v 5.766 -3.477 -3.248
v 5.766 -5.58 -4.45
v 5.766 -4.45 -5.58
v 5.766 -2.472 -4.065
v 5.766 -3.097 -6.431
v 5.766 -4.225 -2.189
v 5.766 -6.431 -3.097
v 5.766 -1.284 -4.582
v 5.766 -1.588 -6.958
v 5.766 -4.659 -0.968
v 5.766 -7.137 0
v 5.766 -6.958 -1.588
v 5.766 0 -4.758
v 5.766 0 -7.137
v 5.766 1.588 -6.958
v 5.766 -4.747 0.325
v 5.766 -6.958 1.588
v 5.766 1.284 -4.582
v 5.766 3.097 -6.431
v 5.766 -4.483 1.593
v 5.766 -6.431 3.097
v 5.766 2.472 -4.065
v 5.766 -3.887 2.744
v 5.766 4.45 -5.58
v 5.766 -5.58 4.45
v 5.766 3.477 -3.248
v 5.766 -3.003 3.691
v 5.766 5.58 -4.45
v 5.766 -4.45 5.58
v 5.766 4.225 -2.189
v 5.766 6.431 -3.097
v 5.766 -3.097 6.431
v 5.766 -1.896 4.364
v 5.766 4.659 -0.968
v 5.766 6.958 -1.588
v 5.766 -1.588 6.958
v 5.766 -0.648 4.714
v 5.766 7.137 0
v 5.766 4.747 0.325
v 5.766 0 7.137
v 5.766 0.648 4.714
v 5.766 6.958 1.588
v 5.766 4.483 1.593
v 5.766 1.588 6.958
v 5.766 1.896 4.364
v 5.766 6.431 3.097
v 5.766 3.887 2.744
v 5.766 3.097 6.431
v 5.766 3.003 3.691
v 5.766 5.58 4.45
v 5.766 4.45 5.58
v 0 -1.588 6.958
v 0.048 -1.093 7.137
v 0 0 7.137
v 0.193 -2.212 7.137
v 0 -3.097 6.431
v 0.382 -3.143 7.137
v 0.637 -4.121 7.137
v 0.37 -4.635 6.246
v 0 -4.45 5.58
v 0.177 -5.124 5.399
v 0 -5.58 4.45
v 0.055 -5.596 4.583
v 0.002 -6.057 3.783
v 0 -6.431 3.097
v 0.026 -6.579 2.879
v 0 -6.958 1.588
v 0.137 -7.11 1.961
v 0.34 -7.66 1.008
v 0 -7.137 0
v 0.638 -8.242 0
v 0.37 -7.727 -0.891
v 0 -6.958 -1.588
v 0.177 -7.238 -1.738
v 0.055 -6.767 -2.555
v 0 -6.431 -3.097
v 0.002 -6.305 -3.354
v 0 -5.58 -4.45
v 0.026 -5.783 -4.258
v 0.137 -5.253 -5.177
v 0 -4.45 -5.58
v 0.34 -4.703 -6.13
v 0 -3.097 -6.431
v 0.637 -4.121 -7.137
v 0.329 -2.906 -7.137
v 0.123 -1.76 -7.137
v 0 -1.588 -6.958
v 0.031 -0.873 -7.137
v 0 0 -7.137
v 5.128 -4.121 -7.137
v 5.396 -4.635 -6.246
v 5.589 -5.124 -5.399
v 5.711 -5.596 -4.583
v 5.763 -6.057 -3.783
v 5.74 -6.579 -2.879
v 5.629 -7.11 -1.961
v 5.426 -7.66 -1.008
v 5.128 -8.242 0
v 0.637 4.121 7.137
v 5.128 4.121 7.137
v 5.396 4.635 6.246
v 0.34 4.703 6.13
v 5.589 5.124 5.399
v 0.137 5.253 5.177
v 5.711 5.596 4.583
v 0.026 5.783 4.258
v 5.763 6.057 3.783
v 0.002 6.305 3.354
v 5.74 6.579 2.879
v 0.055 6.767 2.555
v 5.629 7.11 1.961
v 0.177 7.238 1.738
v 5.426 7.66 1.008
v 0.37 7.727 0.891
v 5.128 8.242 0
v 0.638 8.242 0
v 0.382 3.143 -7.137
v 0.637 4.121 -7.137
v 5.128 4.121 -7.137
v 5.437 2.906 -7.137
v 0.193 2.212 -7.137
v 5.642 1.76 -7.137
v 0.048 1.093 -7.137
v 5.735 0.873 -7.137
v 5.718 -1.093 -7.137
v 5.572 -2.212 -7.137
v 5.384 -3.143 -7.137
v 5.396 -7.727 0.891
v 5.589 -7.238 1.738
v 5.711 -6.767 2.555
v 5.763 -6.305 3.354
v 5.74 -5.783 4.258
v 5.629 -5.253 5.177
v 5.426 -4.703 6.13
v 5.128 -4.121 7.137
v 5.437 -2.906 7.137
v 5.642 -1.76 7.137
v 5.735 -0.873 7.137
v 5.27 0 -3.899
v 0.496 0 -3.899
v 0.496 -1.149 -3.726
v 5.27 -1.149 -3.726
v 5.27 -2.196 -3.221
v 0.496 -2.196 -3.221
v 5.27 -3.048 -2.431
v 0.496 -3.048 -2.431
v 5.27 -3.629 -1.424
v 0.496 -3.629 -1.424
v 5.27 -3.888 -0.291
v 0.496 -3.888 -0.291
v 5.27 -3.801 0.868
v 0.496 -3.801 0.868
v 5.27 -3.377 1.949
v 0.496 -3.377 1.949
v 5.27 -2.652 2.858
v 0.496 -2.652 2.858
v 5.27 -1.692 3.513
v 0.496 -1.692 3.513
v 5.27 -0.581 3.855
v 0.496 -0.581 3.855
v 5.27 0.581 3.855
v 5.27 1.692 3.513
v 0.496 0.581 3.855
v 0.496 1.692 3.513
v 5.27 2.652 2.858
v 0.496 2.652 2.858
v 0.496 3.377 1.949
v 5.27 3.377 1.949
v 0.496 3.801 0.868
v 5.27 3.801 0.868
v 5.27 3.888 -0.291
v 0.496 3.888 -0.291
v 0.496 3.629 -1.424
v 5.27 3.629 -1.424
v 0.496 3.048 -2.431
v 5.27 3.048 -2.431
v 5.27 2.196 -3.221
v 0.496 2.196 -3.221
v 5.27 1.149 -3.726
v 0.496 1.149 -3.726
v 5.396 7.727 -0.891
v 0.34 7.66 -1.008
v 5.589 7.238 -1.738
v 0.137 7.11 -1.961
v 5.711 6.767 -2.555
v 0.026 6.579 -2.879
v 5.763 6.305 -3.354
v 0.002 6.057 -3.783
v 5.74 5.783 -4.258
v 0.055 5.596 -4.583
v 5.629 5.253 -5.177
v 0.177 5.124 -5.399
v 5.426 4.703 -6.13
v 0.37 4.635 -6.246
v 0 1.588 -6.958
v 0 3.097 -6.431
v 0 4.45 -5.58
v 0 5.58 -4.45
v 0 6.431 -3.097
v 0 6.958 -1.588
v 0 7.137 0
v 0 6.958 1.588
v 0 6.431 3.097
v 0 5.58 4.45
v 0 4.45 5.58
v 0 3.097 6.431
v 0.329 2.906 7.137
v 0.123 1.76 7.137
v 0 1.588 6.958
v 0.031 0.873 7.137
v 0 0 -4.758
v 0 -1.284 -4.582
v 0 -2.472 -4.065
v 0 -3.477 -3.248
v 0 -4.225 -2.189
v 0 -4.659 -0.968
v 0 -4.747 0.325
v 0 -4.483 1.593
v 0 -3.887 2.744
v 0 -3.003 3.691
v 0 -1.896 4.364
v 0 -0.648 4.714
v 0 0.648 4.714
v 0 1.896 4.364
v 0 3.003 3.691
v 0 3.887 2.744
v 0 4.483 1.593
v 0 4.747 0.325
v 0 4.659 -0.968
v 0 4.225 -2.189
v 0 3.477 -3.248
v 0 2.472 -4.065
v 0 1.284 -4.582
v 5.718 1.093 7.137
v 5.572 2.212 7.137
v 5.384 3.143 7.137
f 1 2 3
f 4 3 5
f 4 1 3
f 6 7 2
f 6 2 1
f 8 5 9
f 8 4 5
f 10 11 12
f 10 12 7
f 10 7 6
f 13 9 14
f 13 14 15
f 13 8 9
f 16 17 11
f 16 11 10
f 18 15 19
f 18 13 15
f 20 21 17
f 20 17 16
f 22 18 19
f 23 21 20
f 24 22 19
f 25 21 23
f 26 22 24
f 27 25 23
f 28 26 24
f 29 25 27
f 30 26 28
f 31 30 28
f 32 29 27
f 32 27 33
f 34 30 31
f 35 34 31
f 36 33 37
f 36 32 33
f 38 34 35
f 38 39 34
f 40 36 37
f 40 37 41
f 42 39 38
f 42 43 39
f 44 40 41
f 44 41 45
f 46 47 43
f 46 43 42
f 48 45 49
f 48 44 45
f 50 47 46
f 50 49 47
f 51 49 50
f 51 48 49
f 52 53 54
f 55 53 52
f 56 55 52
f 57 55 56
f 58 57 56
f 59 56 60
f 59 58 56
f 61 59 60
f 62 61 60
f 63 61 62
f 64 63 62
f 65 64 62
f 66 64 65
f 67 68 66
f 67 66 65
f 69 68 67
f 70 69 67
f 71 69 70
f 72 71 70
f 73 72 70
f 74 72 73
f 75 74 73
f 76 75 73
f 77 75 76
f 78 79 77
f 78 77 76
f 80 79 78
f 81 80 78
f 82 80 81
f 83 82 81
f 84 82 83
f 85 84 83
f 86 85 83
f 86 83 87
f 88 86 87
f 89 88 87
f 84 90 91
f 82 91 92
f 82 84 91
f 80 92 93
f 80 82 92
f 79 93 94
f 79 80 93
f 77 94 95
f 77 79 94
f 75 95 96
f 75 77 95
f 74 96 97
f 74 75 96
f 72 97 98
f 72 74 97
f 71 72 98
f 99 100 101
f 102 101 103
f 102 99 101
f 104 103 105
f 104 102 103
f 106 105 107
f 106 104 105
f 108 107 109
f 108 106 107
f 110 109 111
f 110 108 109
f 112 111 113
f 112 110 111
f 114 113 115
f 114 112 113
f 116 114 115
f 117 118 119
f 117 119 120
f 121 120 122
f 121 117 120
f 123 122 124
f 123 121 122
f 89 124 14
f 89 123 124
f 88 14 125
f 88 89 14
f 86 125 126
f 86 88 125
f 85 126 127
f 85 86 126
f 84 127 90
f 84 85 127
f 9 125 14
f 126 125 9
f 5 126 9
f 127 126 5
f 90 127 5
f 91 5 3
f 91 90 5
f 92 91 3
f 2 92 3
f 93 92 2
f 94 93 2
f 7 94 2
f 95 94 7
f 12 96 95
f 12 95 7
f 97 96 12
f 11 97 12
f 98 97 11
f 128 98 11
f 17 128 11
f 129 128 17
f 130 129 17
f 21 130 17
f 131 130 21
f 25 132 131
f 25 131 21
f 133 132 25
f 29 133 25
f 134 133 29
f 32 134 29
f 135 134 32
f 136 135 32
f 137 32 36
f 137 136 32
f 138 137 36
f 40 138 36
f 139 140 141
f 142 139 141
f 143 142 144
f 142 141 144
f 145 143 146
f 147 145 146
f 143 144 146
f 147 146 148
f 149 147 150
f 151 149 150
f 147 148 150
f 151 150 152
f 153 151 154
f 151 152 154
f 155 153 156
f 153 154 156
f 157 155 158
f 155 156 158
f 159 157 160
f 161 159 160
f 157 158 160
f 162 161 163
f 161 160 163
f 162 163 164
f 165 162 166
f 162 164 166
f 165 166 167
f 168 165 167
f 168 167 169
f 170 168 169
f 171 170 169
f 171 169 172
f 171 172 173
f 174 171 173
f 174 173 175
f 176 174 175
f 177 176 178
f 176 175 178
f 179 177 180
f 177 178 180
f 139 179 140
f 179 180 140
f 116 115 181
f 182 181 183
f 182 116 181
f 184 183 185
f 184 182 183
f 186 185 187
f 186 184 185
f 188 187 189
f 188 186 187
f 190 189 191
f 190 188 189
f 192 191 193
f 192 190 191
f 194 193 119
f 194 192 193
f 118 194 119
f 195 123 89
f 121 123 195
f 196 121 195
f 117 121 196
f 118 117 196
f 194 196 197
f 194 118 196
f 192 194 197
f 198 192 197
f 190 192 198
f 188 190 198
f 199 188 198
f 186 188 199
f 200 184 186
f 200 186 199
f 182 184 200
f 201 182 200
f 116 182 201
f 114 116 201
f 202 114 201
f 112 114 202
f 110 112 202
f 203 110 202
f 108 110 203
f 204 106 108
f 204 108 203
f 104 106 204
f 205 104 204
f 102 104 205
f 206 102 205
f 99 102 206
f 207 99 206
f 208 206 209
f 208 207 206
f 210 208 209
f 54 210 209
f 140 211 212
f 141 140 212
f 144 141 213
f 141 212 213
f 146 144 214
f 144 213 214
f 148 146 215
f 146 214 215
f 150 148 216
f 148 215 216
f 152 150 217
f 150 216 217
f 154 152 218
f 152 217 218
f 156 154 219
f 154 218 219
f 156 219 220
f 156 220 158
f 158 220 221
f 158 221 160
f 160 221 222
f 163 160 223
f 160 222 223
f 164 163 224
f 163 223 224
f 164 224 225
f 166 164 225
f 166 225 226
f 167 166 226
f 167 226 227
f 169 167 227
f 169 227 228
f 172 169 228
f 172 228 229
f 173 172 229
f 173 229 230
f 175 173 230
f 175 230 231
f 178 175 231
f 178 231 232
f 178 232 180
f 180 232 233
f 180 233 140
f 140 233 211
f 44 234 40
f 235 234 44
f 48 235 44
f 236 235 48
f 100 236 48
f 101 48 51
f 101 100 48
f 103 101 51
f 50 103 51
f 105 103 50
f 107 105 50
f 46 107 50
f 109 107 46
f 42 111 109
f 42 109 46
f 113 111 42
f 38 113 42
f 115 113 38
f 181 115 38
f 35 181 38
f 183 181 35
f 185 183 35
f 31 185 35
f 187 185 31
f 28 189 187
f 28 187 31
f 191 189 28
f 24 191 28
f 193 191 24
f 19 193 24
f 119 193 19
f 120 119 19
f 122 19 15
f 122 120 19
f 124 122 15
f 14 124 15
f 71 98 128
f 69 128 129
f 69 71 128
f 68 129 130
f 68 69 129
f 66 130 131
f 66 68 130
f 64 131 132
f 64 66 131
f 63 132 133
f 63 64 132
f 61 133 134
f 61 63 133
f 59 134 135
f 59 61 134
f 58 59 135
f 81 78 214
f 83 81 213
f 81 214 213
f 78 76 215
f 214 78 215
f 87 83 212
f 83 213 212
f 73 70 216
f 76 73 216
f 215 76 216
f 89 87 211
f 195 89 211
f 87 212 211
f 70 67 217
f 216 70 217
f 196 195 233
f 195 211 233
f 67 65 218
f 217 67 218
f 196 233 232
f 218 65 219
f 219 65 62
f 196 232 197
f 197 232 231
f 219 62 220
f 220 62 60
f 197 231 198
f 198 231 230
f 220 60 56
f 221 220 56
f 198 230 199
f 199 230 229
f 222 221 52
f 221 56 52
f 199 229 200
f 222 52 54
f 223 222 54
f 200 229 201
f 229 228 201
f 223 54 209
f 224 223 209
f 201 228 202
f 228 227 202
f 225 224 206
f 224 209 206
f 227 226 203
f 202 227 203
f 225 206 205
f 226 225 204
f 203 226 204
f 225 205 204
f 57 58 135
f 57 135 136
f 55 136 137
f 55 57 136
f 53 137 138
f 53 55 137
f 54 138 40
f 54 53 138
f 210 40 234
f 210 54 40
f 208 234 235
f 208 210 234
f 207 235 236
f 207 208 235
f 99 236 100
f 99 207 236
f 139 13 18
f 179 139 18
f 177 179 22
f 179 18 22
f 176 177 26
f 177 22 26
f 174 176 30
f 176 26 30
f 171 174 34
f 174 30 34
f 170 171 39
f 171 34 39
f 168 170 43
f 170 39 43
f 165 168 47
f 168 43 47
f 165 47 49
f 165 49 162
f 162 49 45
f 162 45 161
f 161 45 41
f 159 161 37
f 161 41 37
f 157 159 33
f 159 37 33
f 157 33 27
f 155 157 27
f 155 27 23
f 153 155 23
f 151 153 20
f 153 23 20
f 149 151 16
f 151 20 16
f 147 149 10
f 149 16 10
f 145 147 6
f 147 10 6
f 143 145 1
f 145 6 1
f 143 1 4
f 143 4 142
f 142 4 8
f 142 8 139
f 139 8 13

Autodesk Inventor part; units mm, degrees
ref_plane "YZ Plane" through (0, 0, 0) normal (1, 0, 0) x (0, 1, 0)
ref_plane "XZ Plane" through (0, 0, 0) normal (0, 1, 0) x (-1, 0, 0)
sketch "Sketch1" plane through (0, 0, 0) normal (1, 0, 0) x (0, 1, 0)
  line L0 (-8.2416, 0) -> (-4.1208, 7.1374)
  line L1 (-4.1208, 7.1374) -> (4.1208, 7.1374)
  line L2 (4.1208, 7.1374) -> (8.2416, 0)
  line L3 (8.2416, 0) -> (4.1208, -7.1374)
  line L4 (4.1208, -7.1374) -> (-4.1208, -7.1374)
  line L5 (-4.1208, -7.1374) -> (-8.2416, 0)
  point P0 (0, 0)
  point P1 (0, 0)
  dimension "d0" = 16.4831
extrude "Body" add sketch "Sketch1" along normal blind 5.7658
sketch "Sketch2" plane through (0, 0, 0) normal (0, 0, 1) x (1, 0, 0)
  line L0 (0, 4.1208) -> (0, 8.2416) projected
  line L1 (0, 8.2416) -> (5.7658, 8.2416) projected
  line L2 (5.7658, 4.1208) -> (5.7658, 8.2416) projected
  line L3 (-1.1532, 0) -> (6.919, 0) projected
  line L4 (0.6375, 8.2416) -> (0, 7.1374)
  line L5 (5.1283, 8.2416) -> (5.7658, 7.1374)
  dimension "d3" = 30
  dimension "d4" = 30
  dimension "d5" = 14.2748
  dimension "d6" = 14.2748
revolve "Chamfer1" cut sketch "Sketch2" angle 360 about axis through (-10, 0, 0) along (1, 0, 0)
sketch "Sketch3" plane through (5.7658, 0, 0) normal (1, 0, 0) x (0, 0, -1)
  arc A0 (-3.5687, -6.1812) -> (3.5687, -6.1812) centre (0, 0) ccw projected
hole "Thread" at (5.7658, 0, 0) direction (-1, 0, 0) diameter 7.7978 end through all thread size "3/8-16 UNC" class "2B" standard "ANSI Unified Screw Threads"
chamfer "Chamfer2" distance 0.8593 angle 30 1 edges at (5.7658, 0, 3.8989) measured on face at (5.7658, 6.0224, 0.1567)
chamfer "Chamfer3" distance 0.8593 angle 30 1 edges at (0, 0, 3.8989) measured on face at (0, 6.0224, 0.1567)
ref_plane "Work Plane1" through (-16.7887, 0, 0) normal (0, -0.866, -0.5) x (1, 0, 0)
equation "\"d0\" = 1.1547 * SW"
equation "\"d1\" = KOH"
equation "\"d3\" = ANG1"
equation "\"d4\" = ANG2"
equation "\"d5\" = SW0"
equation "\"d6\" = SW01"
equation "\"d8\" = -0.5 * GD1 + 0.5 * NND"
equation "\"d40\" = -0.5 * GD1 + 0.5 * NND"
equation "\"d10\" = -0.5 * GD1 + 0.5 * NND"
equation "\"d41\" = -0.5 * GD1 + 0.5 * NND"
equation "\"ANG1\" = 30deg"
equation "\"ANG2\" = 30deg"
equation "\"NND\" = 9.525"
equation "\"KOH\" = 5.7658"
equation "\"SW\" = 14.2748"
equation "\"SW0\" = SW"
equation "\"SW01\" = SW"
equation "\"THREADDIA\" = 9.525"
equation "\"TOA\" = 30deg"
equation "\"E0\" = 1.155 * SW"
equation "\"GD1\" = 7.806481"
properties part number "AS 2465 - 3/8  UNC" material "Steel, Mild"
